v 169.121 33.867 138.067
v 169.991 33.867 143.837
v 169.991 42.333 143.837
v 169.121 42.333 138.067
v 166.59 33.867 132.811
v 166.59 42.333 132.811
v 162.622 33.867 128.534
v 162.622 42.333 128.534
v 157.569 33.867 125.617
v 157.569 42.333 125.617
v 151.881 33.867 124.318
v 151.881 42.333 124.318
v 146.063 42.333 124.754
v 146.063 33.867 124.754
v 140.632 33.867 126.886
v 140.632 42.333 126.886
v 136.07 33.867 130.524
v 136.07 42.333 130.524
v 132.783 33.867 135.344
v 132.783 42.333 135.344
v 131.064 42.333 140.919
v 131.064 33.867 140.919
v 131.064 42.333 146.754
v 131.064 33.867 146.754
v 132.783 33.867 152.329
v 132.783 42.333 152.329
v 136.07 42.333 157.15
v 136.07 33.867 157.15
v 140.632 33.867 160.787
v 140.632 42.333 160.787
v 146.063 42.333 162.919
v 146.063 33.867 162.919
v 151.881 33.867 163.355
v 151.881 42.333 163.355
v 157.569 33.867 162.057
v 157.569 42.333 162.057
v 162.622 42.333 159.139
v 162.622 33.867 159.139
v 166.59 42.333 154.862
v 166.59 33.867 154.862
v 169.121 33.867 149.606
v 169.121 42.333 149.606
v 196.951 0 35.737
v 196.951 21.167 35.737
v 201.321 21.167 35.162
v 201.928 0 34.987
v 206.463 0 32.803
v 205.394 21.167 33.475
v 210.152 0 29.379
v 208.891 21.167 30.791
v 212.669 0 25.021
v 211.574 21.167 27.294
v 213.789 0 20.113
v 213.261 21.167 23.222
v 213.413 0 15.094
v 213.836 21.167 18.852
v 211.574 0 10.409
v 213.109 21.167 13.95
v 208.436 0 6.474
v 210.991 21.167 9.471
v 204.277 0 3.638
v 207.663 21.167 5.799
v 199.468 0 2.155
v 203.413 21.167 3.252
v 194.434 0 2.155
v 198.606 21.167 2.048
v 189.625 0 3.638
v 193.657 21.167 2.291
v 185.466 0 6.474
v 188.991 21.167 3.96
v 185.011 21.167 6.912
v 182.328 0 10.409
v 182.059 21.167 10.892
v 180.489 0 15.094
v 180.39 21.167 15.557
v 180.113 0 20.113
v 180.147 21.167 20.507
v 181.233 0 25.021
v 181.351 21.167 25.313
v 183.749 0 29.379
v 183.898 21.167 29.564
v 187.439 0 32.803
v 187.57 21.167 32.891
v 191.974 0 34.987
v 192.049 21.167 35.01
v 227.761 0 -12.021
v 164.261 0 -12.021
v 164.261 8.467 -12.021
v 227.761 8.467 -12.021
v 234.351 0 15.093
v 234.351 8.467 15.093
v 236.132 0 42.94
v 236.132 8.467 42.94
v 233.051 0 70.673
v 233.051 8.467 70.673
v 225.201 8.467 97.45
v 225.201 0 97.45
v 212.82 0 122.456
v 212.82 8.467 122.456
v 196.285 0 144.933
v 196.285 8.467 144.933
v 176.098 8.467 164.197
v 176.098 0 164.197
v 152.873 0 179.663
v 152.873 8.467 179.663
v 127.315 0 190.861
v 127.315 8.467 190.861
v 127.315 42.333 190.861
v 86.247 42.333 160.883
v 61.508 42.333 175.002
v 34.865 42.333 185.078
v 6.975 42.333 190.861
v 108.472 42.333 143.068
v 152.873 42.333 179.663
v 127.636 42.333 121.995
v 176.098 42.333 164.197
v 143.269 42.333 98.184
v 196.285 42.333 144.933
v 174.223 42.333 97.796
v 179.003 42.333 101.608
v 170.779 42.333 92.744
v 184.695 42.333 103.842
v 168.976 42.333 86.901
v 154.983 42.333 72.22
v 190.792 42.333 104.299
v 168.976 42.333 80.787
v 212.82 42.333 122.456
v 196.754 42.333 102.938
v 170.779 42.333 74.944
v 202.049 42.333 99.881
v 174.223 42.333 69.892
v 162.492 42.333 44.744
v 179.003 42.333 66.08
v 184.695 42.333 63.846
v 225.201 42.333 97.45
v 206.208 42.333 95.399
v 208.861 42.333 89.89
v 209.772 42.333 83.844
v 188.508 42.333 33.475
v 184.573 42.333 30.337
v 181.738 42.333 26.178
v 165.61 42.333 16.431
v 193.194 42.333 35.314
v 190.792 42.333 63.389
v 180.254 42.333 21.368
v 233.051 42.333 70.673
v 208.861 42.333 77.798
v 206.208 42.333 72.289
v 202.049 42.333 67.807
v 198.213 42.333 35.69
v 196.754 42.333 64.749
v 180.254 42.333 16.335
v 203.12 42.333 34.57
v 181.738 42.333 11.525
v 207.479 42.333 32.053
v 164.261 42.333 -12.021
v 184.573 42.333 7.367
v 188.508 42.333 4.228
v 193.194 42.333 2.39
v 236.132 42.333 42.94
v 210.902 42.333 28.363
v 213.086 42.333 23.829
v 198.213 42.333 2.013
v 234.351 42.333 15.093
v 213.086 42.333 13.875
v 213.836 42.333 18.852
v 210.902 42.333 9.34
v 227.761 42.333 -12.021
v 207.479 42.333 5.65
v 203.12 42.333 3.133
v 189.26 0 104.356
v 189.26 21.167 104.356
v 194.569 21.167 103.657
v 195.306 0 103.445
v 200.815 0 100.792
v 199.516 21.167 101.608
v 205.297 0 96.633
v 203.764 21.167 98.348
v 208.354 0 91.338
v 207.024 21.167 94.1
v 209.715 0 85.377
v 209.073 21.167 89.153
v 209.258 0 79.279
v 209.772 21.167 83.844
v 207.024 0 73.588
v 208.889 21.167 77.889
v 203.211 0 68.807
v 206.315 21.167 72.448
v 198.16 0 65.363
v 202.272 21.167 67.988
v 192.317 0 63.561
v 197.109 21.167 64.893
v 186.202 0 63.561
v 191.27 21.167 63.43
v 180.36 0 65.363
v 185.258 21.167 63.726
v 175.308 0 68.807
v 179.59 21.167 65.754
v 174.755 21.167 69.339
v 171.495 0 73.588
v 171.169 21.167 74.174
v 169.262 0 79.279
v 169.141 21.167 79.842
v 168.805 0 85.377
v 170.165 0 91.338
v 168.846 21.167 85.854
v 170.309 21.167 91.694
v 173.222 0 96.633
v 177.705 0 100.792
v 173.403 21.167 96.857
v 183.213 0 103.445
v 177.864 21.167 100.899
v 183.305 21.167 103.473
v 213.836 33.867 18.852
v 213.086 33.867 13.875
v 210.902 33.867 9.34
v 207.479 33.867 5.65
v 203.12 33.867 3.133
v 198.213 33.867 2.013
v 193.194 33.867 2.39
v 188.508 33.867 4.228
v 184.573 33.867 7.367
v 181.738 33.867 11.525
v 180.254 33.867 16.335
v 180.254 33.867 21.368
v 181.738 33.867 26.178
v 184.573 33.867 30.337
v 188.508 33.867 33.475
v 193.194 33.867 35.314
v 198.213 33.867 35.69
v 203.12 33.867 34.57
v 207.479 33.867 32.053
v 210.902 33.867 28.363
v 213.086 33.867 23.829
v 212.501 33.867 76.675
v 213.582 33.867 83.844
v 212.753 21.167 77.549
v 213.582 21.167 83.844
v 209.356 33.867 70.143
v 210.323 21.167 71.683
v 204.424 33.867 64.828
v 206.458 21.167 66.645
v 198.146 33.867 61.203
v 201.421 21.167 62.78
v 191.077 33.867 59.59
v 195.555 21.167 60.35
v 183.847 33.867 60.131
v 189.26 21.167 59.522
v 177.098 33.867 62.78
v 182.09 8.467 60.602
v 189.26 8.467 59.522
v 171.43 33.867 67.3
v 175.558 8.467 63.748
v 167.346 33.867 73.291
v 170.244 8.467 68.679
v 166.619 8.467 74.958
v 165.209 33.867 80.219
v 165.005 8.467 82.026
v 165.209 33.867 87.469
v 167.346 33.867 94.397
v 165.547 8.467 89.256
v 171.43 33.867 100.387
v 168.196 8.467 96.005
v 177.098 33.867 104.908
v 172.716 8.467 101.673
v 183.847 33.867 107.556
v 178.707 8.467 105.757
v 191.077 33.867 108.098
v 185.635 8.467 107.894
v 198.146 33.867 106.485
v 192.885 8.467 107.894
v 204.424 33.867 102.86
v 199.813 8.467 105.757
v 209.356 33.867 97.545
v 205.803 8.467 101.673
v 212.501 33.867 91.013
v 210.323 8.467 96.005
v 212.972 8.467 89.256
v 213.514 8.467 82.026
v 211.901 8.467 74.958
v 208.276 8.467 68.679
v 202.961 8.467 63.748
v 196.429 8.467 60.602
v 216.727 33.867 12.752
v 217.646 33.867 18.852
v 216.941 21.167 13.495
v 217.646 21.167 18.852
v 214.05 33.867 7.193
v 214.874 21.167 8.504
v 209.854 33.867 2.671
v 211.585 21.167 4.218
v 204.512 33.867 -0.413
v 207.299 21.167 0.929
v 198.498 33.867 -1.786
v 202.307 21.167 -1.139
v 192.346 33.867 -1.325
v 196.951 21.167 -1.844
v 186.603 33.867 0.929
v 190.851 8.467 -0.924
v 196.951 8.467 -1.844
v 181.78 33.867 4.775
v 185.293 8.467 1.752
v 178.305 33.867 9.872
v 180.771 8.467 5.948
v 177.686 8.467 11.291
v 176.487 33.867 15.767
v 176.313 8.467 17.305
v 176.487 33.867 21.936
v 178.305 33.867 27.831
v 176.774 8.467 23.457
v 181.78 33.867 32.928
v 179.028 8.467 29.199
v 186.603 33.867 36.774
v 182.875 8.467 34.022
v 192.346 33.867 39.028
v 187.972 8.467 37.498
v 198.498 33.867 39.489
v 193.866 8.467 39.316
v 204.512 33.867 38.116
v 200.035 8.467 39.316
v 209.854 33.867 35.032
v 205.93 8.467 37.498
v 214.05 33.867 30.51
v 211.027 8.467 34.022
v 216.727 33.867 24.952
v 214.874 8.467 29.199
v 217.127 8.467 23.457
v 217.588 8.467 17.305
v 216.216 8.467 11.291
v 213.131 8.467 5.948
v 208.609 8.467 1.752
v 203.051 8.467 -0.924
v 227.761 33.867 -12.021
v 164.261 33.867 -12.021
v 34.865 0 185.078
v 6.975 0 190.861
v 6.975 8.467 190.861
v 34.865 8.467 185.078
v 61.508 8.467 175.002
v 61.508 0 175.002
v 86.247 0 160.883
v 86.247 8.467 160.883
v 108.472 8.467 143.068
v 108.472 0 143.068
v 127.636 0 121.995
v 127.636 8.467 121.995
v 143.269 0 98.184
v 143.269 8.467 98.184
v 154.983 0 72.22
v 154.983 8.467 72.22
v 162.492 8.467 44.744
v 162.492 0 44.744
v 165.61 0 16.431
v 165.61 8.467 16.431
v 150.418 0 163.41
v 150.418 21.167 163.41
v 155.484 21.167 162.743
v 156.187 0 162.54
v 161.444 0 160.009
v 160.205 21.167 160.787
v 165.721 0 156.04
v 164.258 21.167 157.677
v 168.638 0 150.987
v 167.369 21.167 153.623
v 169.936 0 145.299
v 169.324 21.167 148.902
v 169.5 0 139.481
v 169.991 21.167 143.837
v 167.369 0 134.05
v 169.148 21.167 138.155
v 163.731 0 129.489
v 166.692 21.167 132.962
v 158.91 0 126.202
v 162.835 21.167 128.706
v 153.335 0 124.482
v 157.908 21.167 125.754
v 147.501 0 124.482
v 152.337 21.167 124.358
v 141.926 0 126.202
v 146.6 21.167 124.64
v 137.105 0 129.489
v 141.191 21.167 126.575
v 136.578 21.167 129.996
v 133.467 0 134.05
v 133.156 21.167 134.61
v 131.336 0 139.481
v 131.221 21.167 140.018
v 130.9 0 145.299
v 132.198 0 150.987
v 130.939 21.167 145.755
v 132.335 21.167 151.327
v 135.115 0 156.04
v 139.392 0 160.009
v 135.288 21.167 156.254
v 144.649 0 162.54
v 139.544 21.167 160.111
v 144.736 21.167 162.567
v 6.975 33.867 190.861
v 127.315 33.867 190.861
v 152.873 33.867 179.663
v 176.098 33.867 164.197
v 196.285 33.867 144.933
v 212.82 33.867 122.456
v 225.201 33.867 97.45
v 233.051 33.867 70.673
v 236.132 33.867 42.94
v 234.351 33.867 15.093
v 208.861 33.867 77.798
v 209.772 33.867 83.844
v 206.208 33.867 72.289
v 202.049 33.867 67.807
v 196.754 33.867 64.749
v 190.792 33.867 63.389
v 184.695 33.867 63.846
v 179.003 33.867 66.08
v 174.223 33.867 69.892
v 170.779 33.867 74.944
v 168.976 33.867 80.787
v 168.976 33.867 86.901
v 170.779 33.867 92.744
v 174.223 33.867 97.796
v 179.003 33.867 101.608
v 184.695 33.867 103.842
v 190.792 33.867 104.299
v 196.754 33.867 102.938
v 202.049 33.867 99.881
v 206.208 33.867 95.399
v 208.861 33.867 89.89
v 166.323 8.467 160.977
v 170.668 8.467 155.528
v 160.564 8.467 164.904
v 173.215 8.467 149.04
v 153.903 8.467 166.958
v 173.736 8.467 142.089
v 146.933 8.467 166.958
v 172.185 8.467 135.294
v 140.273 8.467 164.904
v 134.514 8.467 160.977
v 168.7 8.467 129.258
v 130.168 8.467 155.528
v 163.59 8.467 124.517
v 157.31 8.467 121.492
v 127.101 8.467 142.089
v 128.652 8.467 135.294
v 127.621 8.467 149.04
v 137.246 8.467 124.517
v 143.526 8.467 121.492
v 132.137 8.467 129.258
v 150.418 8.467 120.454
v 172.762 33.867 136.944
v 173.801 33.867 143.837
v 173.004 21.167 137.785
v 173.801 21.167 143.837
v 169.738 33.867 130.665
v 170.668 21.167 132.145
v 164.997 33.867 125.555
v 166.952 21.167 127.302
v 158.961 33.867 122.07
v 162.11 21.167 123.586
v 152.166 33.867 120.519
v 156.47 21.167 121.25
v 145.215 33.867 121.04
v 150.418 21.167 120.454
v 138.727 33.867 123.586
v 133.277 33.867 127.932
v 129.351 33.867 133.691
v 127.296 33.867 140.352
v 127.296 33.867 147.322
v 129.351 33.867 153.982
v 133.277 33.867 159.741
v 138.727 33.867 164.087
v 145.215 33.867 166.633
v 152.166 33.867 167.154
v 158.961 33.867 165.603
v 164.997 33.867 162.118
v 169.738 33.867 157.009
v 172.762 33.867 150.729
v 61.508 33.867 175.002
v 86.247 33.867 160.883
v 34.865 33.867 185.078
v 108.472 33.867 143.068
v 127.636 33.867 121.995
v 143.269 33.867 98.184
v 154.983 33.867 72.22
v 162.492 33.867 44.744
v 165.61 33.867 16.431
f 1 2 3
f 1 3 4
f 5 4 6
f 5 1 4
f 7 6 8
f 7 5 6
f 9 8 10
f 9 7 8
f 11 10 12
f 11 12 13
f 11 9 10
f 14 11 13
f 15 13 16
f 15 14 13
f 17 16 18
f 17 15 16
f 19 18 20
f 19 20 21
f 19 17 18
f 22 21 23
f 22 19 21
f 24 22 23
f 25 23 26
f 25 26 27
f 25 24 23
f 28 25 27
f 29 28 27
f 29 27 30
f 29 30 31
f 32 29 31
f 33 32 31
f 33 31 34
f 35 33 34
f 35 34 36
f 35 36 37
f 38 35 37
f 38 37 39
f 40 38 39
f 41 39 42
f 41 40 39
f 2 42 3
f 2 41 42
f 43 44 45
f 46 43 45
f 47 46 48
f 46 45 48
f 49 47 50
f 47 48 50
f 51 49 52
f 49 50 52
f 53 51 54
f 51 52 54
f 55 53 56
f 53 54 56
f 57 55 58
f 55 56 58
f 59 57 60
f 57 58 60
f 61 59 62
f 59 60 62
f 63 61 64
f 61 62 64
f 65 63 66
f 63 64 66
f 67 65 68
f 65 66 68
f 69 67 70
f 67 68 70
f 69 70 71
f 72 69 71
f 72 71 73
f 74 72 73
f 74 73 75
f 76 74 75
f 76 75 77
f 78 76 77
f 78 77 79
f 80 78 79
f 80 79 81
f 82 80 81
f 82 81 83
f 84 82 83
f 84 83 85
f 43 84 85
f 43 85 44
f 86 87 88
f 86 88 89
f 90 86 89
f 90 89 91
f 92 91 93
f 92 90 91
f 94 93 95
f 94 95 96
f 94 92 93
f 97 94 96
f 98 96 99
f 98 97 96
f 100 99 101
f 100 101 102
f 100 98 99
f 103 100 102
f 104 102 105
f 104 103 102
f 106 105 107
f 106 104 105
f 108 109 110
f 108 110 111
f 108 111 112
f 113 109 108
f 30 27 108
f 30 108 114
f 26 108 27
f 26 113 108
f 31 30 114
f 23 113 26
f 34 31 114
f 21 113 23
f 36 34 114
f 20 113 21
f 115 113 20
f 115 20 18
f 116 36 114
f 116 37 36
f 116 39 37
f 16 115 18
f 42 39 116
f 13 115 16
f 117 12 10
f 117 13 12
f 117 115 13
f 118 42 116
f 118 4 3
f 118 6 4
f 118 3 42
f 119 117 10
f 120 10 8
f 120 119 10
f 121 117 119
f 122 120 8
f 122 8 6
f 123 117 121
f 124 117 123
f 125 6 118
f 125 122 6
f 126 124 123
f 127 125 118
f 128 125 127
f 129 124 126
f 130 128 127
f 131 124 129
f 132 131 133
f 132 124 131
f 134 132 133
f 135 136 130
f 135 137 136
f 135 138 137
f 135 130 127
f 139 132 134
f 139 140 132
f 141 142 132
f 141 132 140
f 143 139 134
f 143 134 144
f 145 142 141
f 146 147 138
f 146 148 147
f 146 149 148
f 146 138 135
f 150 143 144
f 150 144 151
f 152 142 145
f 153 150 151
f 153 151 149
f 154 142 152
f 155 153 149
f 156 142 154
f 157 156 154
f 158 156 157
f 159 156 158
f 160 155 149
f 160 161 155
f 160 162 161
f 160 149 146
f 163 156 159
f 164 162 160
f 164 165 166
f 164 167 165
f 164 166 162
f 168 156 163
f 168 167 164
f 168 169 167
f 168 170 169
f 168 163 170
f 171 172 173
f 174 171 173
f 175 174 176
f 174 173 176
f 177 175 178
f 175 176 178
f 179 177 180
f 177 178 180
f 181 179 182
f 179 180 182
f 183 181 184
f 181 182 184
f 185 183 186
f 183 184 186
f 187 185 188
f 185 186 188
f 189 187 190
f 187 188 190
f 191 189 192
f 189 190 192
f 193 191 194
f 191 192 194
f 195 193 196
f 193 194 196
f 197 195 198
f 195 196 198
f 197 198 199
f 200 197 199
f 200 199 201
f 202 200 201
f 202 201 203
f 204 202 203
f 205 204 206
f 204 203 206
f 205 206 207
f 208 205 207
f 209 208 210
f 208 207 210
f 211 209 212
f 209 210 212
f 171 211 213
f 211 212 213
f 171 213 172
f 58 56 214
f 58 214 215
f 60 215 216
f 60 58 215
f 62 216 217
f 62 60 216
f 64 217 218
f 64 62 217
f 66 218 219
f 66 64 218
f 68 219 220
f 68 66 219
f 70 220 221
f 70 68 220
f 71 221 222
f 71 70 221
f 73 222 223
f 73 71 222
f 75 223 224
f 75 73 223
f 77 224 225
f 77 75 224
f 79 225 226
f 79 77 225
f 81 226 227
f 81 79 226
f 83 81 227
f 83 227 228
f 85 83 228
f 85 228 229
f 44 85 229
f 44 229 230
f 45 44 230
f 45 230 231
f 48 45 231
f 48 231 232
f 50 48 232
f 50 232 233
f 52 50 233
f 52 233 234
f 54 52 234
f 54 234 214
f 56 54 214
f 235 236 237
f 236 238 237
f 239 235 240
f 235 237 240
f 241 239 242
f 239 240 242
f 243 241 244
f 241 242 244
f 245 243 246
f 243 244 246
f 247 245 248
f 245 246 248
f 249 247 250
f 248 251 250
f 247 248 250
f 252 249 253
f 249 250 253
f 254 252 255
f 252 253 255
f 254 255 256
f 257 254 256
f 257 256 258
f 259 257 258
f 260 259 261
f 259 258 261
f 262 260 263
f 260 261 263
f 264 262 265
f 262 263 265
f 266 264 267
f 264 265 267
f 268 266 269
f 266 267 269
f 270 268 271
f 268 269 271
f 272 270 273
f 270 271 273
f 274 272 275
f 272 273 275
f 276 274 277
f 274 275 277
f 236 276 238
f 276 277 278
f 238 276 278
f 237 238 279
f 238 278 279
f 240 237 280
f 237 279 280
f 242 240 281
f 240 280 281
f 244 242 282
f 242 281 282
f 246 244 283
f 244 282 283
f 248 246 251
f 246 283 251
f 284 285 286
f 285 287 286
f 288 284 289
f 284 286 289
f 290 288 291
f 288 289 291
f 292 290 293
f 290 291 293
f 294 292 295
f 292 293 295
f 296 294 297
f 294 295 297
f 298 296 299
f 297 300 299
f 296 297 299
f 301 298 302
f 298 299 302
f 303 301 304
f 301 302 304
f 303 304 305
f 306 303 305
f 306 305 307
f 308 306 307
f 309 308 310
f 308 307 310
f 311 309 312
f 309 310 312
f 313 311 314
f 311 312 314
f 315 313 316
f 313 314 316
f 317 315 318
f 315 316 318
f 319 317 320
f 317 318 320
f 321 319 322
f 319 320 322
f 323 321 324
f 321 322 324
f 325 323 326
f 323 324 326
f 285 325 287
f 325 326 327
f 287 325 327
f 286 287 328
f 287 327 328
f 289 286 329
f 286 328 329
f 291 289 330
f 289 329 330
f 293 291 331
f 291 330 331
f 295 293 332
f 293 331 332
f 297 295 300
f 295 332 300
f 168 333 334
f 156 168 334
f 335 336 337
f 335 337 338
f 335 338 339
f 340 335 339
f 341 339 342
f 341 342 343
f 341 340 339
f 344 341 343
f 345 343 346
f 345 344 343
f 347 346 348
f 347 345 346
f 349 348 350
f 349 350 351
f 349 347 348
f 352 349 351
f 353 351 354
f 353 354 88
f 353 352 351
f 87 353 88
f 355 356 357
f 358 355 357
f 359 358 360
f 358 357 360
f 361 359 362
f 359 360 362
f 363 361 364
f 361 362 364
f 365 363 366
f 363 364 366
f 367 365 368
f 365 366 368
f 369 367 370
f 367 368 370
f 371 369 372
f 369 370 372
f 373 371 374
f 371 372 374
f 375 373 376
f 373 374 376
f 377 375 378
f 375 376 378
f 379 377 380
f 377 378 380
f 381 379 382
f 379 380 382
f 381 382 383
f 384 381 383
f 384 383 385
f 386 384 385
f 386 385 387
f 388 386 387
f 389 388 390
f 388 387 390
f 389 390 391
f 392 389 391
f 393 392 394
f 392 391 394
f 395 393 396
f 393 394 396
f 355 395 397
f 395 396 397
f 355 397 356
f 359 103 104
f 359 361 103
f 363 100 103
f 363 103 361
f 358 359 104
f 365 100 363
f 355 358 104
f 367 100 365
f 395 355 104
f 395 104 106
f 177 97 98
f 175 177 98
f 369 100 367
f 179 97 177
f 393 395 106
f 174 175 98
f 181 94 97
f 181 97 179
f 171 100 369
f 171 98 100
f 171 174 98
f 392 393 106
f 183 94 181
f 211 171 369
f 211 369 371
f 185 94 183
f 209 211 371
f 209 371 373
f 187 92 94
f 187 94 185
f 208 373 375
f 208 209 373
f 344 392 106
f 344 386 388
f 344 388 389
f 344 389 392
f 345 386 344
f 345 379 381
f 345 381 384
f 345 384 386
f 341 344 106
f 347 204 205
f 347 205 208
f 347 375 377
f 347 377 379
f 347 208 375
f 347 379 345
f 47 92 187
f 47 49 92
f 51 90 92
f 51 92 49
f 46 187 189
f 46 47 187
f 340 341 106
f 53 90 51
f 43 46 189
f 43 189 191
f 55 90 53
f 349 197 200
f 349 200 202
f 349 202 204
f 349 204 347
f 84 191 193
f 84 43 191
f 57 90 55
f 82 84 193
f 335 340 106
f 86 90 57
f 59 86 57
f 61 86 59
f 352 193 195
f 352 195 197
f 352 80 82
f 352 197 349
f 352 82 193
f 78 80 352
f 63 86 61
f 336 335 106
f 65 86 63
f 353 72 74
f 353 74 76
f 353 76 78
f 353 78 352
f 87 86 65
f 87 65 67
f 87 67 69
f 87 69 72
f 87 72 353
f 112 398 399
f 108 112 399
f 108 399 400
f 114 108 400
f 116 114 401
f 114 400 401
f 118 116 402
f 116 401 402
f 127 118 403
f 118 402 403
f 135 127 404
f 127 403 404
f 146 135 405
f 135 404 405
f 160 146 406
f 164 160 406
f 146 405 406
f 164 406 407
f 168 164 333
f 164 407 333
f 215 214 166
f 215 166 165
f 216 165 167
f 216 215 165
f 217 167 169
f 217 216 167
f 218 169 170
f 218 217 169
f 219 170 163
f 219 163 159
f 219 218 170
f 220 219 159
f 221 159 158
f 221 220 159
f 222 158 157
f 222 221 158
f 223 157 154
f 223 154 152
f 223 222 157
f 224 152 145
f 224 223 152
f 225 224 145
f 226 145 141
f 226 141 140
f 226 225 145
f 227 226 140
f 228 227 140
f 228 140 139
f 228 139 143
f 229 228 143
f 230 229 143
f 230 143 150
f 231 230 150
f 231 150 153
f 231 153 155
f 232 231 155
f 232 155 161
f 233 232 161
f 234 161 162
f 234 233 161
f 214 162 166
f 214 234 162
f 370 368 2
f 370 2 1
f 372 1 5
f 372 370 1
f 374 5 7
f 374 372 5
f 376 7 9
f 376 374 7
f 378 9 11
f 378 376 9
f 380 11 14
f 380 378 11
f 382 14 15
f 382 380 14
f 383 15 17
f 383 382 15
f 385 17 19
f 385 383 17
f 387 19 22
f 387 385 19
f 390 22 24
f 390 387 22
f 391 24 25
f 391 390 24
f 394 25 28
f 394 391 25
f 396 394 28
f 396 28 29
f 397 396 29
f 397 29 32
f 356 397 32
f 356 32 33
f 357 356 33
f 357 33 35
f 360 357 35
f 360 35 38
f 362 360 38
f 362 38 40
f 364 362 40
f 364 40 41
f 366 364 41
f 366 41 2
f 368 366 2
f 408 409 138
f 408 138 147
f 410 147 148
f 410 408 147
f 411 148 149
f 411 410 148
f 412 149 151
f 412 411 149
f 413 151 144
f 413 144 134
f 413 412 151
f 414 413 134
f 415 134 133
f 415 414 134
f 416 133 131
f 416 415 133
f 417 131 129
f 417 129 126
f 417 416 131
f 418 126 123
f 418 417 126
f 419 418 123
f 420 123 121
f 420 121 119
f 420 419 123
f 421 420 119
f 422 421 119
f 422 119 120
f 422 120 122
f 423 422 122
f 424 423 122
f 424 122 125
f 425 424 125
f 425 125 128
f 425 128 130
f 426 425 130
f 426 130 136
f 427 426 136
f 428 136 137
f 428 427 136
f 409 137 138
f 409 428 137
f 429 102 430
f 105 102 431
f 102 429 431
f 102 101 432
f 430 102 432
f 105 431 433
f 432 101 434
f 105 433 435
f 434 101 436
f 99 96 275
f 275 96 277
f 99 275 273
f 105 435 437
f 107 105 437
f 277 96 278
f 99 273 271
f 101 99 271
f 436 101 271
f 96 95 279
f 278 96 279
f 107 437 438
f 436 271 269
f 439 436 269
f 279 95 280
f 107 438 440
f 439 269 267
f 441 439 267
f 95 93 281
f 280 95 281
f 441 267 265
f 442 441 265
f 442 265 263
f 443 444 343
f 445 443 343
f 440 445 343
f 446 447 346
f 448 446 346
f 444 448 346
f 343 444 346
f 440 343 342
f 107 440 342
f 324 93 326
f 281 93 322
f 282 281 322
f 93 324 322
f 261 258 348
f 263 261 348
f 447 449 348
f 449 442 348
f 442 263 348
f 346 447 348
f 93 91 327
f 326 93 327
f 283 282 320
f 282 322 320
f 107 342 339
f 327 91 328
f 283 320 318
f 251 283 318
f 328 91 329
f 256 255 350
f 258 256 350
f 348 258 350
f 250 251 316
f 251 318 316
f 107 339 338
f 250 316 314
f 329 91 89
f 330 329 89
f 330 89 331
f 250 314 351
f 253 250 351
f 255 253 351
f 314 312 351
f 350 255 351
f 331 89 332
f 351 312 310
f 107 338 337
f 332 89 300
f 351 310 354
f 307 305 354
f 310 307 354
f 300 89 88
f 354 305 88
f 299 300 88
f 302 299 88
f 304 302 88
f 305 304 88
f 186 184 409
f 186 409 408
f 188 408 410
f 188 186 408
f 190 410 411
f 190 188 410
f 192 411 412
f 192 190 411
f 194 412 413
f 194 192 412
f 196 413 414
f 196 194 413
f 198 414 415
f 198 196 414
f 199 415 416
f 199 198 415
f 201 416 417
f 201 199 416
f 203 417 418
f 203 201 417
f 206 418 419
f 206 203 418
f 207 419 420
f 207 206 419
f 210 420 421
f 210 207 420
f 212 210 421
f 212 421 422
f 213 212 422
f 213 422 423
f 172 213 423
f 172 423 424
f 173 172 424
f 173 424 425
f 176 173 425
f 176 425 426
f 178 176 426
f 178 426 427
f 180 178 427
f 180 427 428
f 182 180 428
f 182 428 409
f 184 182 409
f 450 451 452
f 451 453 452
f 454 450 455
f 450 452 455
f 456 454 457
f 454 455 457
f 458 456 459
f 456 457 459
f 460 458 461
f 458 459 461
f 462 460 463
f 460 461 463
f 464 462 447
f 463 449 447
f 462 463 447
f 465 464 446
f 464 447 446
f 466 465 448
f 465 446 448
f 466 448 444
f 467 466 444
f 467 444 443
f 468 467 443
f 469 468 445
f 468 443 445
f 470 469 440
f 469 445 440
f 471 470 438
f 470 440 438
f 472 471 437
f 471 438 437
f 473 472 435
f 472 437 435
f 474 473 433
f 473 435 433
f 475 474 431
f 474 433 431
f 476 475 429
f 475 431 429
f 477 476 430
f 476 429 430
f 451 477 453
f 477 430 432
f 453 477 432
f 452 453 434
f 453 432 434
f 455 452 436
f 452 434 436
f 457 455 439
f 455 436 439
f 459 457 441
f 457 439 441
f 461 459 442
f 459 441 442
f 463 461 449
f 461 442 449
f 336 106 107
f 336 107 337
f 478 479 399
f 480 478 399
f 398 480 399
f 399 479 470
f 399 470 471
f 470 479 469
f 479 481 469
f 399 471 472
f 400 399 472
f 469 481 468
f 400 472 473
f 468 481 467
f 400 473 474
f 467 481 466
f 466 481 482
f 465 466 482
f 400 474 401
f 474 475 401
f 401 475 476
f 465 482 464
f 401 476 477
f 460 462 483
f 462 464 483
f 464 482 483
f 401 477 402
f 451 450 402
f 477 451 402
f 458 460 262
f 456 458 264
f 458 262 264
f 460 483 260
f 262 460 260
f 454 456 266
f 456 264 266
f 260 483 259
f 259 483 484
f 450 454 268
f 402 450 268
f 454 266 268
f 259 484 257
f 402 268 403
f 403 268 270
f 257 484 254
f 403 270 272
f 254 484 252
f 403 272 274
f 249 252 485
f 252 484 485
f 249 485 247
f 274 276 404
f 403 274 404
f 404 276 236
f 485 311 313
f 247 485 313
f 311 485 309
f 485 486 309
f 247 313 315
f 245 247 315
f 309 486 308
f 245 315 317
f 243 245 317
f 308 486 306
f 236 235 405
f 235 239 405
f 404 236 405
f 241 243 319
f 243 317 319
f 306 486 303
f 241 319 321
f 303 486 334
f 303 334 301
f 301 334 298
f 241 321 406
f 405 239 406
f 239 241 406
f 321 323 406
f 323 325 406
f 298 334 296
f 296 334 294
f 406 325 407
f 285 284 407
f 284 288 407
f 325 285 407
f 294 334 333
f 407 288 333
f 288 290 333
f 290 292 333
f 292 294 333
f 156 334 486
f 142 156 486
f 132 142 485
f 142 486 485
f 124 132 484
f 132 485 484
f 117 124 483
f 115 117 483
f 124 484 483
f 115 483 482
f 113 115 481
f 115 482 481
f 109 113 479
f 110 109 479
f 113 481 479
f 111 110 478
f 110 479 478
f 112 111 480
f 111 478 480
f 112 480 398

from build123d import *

# Parameters (mm, degrees)
BOSS_EXTRUDE1_DEPTH = 8.466666667
SKETCH2_R           = 16.885394085
SKETCH2_R_2         = 20.512287495
SKETCH2_R_3         = 19.572941721
CUT_EXTRUDE3_DEPTH  = 304.774506345
BOSS_EXTRUDE2_START = 12.7
SKETCH2_4_R         = 20.695394085
SKETCH2_4_R_2       = 16.885394085
SKETCH2_4_R_3       = 24.322287495
SKETCH2_4_R_4       = 20.512287495
SKETCH2_4_R_5       = 23.382941721
SKETCH2_4_R_6       = 19.572941721
BOSS_EXTRUDE2_DEPTH = 12.7


with BuildPart() as part:
    # Sketch1 → Boss-Extrude1 (new body)
    with BuildSketch(Plane(origin=(0, 0, 0), x_dir=(1, 0, 0), z_dir=(0, 1, 0))):
        with BuildLine():
            Line((164.261221292, 12.021360676), (227.761221292, 12.021360676))
            ThreePointArc((227.761221292, 12.021360676), (219.55639394, -110.223196762), (127.314749355, -190.861463232))
            Line((127.314749355, -190.861463232), (6.974690834, -190.861455535))
            ThreePointArc((6.974690834, -190.861455535), (127.636363086, -121.995154476), (164.261221292, 12.021360676))
        make_face()
    boss_extrude1 = extrude(amount=BOSS_EXTRUDE1_DEPTH)

    # Sketch2 → Cut-Extrude3 (cut, through all)
    with BuildSketch(Plane(origin=(0, 8.466666667, 0), x_dir=(1, 0, 0), z_dir=(0, 1, 0))):
        with Locations((196.950964228, -18.851615567)):
            Circle(SKETCH2_R)
        with Locations((189.259581589, -83.843798865)):
            Circle(SKETCH2_R_2)
        with Locations((150.418099263, -143.836583448)):
            Circle(SKETCH2_R_3)
    cut_extrude3 = extrude(amount=-CUT_EXTRUDE3_DEPTH, mode=Mode.SUBTRACT)

    # Sketch2<4> → Boss-Extrude2 (add)
    # profile 1 of 3: a face of its own
    with BuildSketch(Plane(origin=(0, 8.466666667, 0), x_dir=(1, 0, 0), z_dir=(0, 1, 0)).offset(BOSS_EXTRUDE2_START)):
        with Locations((196.950964228, -18.851615567)):
            Circle(SKETCH2_4_R)
        with Locations((196.950964228, -18.851615567)):
            Circle(SKETCH2_4_R_2, mode=Mode.SUBTRACT)
    # profile 2 of 3: a face of its own
    with BuildSketch(Plane(origin=(0, 8.466666667, 0), x_dir=(1, 0, 0), z_dir=(0, 1, 0)).offset(BOSS_EXTRUDE2_START)):
        with Locations((189.259581589, -83.843798865)):
            Circle(SKETCH2_4_R_3)
        with Locations((189.259581589, -83.843798865)):
            Circle(SKETCH2_4_R_4, mode=Mode.SUBTRACT)
    # profile 3 of 3: a face of its own
    with BuildSketch(Plane(origin=(0, 8.466666667, 0), x_dir=(1, 0, 0), z_dir=(0, 1, 0)).offset(BOSS_EXTRUDE2_START)):
        with Locations((150.418099263, -143.836583448)):
            Circle(SKETCH2_4_R_5)
        with Locations((150.418099263, -143.836583448)):
            Circle(SKETCH2_4_R_6, mode=Mode.SUBTRACT)
    boss_extrude2 = extrude(amount=-BOSS_EXTRUDE2_DEPTH)

    # Mirror3: Boss-Extrude1, Cut-Extrude3, Boss-Extrude2 across plane
    add(boss_extrude1.mirror(Plane.ZX.offset(21.166666667)))
    add(cut_extrude3.mirror(Plane.ZX.offset(21.166666667)), mode=Mode.SUBTRACT)
    add(boss_extrude2.mirror(Plane.ZX.offset(21.166666667)))


solid = part.part
